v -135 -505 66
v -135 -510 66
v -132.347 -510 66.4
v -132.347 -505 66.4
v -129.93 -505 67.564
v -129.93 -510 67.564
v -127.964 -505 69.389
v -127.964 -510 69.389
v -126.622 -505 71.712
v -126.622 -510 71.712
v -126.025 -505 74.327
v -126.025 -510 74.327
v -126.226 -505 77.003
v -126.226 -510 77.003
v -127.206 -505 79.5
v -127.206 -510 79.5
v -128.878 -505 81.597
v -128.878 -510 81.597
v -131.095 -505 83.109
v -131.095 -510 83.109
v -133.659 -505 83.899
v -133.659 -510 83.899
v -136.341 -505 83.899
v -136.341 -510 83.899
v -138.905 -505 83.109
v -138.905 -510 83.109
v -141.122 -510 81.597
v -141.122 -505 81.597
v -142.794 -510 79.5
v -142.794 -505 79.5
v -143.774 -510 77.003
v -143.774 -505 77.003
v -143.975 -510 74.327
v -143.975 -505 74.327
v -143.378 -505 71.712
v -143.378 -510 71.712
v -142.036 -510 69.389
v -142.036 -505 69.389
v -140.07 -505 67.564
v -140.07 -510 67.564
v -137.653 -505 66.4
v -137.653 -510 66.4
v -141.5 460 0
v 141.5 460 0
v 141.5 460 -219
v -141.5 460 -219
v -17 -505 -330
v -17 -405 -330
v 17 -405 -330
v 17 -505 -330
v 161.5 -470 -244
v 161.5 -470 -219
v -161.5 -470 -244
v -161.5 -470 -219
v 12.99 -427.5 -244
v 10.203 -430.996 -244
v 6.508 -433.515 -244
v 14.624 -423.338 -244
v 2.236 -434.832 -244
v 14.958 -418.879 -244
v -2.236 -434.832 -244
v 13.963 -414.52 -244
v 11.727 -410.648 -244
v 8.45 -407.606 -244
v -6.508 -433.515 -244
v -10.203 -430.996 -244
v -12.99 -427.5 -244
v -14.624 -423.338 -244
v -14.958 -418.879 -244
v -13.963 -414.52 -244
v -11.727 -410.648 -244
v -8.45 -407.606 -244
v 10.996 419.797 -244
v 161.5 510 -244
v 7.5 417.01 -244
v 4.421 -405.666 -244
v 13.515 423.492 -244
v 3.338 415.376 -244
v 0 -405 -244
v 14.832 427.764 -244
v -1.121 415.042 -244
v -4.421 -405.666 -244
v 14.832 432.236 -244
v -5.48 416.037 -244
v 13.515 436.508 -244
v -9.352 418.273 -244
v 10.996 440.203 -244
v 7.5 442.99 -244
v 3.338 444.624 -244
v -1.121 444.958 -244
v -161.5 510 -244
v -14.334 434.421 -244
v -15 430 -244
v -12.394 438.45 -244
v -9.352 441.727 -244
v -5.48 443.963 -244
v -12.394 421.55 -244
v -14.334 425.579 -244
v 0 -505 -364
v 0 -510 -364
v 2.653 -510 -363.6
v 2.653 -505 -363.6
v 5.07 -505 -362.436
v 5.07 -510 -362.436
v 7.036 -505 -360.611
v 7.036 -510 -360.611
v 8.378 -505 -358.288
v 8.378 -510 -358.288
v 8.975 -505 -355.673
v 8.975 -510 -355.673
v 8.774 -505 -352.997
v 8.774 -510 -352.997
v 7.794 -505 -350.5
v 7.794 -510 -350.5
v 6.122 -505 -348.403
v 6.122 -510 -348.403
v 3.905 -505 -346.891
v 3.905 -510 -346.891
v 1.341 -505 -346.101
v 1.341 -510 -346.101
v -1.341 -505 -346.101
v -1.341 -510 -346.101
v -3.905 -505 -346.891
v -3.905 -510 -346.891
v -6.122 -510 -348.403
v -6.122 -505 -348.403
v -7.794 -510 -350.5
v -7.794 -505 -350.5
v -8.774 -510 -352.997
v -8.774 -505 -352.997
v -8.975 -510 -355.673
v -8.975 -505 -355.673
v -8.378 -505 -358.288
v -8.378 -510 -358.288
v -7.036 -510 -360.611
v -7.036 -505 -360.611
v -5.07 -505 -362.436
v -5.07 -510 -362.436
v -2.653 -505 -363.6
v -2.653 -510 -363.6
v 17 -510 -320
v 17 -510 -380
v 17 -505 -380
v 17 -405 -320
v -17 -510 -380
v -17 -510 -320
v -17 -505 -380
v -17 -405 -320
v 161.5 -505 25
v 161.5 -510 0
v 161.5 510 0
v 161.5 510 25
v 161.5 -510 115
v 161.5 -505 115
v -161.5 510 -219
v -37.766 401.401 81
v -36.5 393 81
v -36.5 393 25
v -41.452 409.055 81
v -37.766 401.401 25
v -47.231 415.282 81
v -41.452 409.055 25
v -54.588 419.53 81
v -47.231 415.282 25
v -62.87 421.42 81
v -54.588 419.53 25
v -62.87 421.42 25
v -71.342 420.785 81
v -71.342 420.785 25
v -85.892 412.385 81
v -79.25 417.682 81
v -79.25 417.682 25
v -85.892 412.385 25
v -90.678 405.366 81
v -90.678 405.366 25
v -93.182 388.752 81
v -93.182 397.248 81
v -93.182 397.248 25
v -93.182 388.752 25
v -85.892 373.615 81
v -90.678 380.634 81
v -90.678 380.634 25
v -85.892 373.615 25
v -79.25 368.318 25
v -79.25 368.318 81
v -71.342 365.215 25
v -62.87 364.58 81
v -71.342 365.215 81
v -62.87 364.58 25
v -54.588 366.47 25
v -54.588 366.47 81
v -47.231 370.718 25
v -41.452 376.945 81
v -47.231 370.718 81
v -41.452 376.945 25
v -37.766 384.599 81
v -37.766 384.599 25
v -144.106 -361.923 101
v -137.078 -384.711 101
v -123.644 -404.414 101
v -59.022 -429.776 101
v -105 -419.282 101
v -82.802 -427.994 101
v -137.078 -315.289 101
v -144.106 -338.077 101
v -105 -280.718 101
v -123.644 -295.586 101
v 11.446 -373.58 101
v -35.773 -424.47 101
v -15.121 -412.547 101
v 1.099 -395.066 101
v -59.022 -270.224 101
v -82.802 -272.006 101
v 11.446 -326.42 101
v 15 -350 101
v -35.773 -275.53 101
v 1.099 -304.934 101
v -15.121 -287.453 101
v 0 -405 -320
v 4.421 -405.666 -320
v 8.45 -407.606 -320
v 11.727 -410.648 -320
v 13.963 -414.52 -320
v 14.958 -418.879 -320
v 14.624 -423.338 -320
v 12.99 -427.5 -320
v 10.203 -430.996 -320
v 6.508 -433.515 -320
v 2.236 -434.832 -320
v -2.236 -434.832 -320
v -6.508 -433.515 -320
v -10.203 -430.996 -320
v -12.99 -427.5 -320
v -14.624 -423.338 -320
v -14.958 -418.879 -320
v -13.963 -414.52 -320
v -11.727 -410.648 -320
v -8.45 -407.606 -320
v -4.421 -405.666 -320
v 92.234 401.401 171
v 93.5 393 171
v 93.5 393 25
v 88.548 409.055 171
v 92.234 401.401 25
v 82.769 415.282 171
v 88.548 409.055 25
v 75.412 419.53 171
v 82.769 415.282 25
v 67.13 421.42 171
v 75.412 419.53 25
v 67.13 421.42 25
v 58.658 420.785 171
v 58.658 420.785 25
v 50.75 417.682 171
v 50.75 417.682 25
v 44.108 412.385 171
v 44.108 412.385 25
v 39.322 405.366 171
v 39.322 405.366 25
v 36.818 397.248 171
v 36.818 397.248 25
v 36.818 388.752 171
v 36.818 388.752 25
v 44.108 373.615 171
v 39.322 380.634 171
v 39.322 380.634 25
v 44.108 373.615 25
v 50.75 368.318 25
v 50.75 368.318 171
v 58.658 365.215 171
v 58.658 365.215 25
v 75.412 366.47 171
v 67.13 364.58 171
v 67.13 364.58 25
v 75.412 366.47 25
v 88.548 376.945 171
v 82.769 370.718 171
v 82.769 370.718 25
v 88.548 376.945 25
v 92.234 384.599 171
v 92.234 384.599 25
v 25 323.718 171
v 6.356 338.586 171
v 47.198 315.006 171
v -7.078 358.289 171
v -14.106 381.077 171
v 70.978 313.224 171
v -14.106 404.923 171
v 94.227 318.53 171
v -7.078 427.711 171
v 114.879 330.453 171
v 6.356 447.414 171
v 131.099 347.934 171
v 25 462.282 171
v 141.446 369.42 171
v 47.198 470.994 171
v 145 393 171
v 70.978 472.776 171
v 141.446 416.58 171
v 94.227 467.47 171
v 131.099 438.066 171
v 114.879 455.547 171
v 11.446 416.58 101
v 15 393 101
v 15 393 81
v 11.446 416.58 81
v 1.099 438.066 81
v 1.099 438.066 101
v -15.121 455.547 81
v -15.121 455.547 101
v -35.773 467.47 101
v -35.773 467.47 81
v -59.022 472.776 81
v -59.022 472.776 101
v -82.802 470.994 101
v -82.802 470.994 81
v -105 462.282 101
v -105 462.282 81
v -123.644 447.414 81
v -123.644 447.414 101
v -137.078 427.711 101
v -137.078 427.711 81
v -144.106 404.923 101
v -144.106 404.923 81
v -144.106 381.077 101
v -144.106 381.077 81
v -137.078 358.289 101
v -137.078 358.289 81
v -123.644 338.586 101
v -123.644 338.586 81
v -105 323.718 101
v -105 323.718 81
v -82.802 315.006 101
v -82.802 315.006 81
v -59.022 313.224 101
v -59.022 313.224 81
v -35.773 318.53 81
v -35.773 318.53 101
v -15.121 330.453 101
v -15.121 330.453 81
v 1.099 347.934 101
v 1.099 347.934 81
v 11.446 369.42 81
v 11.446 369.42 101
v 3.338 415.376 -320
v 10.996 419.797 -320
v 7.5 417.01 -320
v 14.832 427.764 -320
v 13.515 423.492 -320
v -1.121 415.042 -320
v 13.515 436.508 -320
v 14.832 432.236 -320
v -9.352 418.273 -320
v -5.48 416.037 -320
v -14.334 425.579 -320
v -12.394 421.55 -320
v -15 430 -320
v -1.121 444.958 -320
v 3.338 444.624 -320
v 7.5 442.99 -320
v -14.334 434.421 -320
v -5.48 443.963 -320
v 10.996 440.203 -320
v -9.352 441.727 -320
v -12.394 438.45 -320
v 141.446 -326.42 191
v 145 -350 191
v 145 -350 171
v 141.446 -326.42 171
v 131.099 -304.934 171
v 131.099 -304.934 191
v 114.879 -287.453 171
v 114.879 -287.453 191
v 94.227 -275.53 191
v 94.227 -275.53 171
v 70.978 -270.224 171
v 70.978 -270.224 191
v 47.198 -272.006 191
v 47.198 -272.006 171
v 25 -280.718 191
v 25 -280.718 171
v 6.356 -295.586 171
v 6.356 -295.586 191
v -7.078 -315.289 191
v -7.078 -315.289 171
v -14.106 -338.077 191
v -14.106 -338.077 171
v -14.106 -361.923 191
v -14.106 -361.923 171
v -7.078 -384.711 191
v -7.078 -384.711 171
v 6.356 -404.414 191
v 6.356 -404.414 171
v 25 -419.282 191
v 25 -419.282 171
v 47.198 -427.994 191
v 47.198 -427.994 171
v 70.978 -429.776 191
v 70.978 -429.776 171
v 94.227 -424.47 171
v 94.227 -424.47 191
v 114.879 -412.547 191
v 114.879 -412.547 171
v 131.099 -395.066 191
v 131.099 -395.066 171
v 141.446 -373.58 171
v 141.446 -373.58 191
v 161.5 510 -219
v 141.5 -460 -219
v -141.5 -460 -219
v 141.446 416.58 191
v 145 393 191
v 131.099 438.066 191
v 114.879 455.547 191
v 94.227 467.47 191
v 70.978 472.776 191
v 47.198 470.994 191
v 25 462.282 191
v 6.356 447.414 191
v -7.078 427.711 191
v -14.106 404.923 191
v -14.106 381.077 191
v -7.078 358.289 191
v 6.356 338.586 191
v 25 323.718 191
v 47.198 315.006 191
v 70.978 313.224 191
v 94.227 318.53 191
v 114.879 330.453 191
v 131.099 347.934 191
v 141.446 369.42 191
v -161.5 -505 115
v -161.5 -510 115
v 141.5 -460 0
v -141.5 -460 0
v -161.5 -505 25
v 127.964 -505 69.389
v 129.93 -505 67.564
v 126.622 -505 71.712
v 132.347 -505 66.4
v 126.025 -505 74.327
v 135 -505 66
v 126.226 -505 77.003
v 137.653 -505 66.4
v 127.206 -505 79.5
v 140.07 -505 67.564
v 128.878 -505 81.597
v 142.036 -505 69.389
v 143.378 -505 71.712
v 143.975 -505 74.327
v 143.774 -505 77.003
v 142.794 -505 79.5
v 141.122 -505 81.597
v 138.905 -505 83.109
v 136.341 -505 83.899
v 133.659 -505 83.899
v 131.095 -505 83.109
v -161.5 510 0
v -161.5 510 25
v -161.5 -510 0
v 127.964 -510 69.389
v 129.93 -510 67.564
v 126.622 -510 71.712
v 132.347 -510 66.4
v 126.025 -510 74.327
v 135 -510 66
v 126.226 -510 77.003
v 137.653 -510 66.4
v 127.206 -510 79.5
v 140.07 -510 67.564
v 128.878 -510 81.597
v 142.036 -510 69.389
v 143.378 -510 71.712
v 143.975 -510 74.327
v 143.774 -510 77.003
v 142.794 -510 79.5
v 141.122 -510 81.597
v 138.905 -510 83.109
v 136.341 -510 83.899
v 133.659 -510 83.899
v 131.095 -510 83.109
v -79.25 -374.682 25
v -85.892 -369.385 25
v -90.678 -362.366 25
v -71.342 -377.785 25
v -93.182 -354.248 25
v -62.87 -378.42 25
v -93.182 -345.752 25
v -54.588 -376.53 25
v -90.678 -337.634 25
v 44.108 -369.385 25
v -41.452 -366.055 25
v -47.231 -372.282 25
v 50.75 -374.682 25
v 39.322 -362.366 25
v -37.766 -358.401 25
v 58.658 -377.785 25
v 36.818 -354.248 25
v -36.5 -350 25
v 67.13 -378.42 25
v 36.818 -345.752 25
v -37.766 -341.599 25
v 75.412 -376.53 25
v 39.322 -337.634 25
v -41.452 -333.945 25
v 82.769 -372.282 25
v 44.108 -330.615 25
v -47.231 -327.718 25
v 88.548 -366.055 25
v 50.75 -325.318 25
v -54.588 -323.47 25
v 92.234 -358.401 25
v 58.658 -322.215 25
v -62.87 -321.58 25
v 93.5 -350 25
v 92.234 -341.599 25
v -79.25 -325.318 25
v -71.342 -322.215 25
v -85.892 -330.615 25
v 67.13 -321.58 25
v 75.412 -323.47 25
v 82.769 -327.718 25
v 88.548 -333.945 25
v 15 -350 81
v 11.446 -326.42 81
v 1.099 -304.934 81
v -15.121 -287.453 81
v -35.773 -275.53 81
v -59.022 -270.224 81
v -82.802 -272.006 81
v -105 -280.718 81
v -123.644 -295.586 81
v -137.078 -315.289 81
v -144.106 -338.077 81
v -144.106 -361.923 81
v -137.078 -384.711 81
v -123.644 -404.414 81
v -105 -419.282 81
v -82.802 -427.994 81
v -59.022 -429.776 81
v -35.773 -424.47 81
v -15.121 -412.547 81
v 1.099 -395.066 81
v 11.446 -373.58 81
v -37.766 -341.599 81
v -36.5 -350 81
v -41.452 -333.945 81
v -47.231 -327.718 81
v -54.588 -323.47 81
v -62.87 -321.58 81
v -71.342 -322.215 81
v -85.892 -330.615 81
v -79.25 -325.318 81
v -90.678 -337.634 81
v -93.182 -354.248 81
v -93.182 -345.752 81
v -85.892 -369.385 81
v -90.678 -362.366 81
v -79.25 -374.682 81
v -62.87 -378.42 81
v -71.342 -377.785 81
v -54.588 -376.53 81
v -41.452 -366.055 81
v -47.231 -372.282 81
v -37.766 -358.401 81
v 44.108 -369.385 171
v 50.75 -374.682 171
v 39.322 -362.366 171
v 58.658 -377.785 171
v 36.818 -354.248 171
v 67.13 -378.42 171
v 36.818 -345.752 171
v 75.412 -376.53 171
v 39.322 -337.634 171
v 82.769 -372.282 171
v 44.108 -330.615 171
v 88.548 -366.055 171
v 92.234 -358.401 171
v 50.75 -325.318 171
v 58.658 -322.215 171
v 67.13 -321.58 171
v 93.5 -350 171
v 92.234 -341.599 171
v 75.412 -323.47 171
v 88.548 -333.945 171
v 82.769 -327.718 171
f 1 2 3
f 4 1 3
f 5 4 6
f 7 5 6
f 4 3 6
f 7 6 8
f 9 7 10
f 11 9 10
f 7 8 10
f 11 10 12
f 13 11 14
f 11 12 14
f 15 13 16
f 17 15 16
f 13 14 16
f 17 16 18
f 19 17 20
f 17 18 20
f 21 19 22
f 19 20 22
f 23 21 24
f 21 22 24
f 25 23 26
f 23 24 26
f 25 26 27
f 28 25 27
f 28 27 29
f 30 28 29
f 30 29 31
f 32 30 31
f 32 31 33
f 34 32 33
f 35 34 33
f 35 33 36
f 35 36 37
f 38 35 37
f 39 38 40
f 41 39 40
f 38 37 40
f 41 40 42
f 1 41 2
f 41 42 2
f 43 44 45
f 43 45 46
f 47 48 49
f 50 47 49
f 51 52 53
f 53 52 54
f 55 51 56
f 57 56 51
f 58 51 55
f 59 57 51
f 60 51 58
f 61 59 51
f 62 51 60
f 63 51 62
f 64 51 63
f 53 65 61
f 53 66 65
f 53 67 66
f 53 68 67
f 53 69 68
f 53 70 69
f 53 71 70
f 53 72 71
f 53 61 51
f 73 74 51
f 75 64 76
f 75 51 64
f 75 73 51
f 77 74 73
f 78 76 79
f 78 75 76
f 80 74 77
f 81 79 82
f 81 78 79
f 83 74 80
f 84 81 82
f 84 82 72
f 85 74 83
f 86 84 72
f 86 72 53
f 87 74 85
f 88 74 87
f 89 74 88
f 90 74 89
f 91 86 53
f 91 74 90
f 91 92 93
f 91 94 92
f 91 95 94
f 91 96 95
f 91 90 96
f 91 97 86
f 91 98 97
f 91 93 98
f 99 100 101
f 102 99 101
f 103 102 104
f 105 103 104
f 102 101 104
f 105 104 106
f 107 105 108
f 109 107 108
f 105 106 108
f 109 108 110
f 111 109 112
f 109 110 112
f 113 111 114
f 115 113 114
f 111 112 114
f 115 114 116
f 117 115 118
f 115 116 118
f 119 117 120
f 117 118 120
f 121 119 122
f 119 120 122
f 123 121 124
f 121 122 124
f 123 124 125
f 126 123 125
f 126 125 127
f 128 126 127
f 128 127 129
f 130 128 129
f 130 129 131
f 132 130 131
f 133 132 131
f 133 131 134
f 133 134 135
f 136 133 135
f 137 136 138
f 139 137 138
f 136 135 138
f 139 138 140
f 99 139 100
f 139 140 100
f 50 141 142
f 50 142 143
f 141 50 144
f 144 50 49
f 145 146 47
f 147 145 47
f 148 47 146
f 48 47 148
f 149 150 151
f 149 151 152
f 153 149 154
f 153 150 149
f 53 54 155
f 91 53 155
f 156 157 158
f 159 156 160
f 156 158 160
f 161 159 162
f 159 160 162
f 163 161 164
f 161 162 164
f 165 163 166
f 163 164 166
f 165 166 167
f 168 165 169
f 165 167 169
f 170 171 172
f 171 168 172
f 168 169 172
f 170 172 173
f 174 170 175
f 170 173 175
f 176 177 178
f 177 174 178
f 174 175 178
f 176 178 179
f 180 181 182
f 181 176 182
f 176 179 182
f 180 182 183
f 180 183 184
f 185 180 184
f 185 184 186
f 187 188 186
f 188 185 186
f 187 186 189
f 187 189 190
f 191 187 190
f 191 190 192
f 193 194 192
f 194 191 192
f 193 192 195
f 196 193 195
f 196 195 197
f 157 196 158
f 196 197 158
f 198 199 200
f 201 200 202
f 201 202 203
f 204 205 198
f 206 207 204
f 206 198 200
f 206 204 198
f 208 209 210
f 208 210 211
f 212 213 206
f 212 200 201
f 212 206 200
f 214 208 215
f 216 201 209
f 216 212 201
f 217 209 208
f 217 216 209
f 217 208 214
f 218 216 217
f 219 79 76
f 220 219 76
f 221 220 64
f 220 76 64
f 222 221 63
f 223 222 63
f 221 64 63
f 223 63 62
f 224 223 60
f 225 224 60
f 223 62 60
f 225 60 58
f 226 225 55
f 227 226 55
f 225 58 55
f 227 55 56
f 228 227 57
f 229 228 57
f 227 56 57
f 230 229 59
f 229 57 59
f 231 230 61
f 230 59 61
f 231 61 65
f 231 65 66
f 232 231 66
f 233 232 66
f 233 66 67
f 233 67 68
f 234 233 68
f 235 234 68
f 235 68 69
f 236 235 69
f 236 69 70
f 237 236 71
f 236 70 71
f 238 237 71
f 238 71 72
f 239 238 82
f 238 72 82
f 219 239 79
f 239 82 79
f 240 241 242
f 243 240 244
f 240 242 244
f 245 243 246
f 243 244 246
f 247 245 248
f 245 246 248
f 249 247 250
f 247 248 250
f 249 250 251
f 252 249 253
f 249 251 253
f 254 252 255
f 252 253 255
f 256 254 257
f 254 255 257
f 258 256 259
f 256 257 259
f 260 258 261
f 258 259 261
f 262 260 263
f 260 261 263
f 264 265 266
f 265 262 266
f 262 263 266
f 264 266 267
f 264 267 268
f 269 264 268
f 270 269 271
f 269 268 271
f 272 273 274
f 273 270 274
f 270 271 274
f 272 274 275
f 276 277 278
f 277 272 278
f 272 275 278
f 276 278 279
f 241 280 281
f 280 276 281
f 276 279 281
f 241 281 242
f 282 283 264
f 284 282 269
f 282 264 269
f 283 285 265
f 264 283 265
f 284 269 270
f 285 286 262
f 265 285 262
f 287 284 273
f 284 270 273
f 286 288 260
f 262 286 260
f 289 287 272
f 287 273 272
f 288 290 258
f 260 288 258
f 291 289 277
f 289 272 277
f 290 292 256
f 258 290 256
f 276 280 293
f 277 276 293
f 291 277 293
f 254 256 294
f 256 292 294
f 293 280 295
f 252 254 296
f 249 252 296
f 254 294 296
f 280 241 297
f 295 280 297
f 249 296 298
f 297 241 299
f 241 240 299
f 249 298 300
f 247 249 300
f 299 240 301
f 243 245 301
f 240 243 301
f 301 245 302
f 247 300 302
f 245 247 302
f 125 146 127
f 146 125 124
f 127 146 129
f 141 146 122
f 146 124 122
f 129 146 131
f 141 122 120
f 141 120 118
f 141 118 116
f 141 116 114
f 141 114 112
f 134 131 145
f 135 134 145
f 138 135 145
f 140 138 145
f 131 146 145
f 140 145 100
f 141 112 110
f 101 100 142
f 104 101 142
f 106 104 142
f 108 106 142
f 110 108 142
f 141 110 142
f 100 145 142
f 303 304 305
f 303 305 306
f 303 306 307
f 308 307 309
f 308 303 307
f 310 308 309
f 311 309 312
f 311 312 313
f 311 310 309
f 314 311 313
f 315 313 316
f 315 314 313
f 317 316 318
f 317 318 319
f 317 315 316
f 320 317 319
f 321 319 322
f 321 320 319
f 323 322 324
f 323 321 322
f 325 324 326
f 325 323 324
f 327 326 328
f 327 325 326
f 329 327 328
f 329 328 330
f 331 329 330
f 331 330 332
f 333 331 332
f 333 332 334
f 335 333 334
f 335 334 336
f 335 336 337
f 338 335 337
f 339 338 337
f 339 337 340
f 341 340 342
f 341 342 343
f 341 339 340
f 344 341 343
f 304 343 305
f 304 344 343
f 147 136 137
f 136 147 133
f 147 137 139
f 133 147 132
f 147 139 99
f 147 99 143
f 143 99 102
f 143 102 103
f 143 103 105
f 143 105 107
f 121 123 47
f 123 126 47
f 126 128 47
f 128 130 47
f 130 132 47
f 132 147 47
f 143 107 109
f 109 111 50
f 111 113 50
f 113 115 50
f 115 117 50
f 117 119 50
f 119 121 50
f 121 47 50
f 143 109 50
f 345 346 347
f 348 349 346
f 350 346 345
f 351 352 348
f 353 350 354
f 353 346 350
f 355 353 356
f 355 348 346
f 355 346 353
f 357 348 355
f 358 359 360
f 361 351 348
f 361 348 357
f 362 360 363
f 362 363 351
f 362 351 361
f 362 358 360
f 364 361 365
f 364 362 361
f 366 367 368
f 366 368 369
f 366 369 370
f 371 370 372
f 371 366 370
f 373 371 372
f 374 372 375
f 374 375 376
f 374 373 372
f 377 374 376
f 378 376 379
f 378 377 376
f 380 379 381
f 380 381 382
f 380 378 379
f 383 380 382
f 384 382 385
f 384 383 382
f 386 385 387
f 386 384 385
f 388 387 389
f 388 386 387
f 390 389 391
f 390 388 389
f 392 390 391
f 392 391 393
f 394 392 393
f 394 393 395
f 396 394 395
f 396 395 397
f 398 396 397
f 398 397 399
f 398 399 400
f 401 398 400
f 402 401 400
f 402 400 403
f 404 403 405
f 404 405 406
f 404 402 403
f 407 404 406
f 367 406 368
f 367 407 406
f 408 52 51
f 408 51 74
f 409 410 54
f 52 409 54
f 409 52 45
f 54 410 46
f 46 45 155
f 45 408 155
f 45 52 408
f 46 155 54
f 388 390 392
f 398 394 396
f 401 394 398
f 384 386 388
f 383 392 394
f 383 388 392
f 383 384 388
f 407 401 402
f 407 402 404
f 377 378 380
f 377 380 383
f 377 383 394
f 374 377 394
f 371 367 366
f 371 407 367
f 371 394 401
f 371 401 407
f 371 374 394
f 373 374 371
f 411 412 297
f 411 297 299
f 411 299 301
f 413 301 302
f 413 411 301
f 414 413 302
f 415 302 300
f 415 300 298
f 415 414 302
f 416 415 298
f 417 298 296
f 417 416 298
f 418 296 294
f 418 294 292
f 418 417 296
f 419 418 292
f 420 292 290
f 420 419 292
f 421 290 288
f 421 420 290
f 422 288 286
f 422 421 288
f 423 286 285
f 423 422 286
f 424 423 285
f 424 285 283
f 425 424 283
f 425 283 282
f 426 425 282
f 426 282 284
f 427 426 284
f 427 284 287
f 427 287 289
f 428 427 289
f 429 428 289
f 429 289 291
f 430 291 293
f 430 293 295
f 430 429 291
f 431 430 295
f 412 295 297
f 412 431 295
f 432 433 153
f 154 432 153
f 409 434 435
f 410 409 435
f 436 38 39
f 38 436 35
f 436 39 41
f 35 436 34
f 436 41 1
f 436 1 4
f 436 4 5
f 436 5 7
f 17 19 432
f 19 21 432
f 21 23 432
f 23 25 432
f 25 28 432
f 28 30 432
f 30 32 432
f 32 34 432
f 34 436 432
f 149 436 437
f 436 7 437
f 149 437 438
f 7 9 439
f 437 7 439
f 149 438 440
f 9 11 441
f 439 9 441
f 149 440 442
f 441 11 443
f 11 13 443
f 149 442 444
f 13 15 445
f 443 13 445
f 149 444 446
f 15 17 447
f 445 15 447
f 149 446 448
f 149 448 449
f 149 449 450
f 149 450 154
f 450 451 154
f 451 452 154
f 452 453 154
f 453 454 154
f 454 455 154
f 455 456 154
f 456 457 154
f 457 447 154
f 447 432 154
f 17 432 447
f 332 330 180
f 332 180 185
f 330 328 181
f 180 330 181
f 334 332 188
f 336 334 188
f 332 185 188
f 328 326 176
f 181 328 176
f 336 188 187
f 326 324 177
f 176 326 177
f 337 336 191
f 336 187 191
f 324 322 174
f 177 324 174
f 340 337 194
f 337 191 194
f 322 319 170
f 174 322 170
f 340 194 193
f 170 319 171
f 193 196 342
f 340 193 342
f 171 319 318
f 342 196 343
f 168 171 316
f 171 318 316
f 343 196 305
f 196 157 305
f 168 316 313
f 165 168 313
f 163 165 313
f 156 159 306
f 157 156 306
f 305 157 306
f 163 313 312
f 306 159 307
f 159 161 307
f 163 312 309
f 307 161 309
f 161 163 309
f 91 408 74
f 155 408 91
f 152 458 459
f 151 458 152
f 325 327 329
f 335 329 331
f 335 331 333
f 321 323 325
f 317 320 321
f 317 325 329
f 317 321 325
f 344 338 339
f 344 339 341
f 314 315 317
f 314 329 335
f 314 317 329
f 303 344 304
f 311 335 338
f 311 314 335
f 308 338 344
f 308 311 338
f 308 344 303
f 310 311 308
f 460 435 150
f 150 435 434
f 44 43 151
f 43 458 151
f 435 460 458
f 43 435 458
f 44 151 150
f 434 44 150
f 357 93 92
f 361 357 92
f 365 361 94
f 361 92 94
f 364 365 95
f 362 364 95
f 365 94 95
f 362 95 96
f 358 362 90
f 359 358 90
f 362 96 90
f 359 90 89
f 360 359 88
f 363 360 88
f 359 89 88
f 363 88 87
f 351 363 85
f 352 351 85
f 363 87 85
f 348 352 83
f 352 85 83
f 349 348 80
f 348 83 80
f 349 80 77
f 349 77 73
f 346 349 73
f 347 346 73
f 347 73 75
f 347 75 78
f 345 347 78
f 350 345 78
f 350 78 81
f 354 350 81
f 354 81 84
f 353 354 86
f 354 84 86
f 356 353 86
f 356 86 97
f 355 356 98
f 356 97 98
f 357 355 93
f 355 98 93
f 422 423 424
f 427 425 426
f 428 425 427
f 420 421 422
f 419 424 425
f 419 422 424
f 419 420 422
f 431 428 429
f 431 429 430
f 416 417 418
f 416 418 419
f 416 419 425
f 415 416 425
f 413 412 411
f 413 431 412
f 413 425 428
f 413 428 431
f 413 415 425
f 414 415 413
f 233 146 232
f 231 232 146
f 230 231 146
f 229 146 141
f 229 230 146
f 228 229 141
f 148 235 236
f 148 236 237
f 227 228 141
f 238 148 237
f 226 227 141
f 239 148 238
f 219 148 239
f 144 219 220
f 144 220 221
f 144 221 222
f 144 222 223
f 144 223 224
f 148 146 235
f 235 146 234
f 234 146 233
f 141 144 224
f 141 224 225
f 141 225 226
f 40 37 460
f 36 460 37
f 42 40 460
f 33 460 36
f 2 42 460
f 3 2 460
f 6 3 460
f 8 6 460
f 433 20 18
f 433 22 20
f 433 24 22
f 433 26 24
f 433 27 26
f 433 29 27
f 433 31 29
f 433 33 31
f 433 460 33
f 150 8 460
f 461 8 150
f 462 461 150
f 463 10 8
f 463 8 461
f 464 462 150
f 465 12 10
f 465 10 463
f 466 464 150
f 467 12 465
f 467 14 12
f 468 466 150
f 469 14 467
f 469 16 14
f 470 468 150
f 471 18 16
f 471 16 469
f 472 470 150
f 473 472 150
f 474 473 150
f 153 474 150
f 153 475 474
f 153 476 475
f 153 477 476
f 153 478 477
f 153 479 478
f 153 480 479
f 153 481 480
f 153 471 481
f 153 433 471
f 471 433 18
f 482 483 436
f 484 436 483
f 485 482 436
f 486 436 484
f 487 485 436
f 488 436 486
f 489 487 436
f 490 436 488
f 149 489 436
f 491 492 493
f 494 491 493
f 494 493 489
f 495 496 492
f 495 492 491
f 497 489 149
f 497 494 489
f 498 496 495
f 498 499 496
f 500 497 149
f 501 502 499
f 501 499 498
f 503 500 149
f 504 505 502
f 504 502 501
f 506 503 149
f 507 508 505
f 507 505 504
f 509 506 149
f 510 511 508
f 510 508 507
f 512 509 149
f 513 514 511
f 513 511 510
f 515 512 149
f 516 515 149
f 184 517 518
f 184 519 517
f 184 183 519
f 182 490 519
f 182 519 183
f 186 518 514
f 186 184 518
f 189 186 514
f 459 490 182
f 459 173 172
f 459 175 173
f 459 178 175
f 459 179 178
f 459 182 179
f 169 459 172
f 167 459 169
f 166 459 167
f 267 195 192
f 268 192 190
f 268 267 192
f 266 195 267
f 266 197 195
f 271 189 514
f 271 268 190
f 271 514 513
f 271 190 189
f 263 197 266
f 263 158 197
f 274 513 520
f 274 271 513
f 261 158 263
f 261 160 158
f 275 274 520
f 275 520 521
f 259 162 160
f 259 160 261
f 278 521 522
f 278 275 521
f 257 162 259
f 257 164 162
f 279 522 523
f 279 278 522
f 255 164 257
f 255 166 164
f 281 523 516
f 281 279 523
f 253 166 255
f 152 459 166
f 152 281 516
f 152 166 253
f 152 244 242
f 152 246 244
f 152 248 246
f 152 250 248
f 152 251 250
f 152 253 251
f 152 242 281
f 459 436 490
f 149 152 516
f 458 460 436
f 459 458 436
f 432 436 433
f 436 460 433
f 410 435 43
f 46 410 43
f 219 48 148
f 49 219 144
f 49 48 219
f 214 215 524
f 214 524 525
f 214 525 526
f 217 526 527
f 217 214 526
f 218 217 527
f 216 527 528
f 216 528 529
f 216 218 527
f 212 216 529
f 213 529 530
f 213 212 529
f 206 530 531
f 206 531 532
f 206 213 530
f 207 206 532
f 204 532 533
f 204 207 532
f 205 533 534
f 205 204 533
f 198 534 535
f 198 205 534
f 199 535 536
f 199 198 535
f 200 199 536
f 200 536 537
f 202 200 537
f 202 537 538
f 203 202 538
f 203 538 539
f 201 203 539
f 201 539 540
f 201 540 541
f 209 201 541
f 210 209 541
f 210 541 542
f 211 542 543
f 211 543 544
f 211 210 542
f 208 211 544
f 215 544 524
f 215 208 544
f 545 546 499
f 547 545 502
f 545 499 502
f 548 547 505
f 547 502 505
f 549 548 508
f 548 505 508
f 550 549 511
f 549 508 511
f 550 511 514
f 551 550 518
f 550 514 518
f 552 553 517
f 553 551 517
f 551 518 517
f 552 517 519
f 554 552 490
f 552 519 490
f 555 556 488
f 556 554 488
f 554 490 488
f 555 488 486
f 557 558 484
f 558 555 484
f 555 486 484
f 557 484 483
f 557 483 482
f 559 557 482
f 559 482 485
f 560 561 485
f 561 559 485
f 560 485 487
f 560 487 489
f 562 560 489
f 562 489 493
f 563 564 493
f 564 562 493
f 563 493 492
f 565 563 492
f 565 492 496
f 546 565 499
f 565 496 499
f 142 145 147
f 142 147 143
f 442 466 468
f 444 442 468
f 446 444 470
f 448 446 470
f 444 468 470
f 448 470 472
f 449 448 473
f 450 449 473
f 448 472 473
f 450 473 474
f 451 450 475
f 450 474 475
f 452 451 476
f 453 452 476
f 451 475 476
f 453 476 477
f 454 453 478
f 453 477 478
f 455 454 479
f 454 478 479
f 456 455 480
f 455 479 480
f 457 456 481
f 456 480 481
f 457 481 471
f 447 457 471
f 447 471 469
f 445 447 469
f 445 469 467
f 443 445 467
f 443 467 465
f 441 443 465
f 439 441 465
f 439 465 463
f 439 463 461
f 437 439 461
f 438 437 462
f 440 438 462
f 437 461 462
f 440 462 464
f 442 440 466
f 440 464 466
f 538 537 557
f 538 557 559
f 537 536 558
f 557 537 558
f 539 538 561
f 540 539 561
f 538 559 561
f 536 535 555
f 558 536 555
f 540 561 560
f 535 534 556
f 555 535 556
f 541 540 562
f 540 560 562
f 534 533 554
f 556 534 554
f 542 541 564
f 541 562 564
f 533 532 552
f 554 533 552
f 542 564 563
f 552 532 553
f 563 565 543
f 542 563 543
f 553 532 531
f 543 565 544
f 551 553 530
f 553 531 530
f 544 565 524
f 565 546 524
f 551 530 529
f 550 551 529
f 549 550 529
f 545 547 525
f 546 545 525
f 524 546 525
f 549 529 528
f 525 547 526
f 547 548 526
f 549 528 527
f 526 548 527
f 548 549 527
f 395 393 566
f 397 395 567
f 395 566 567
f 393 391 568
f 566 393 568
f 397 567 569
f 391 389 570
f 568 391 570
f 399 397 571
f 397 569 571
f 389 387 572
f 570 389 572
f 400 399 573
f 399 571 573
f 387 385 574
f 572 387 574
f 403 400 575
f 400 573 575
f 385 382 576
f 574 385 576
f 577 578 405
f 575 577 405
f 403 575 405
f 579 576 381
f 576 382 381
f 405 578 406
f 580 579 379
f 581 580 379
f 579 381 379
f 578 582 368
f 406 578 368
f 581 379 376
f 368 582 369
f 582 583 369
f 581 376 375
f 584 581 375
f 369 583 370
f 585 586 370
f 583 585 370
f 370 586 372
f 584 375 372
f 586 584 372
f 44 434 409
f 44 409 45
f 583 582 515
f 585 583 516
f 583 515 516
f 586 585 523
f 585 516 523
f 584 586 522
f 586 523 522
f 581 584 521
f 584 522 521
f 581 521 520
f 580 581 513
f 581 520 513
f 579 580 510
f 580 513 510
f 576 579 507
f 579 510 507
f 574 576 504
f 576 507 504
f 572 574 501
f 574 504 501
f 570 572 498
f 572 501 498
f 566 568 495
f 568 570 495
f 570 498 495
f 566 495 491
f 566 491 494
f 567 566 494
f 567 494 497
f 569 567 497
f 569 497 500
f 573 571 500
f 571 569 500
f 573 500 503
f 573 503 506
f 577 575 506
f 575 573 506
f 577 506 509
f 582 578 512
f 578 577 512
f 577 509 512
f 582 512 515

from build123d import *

# Parameters (mm, degrees)
SKETCH_1_W        = 323
SKETCH_1_H        = 1020
EXTRUDE_1_DEPTH   = 25
SKETCH_3_W        = 323
SKETCH_3_H        = 980
EXTRUDE_2_DEPTH   = 25
SKETCH_15_W       = 283
SKETCH_15_H       = 920
EXTRUDE3_DEPTH    = 219
SKETCH3_W         = 323
SKETCH3_H         = 90
SKETCH3_R         = 9
SKETCH3_W_2       = 34
SKETCH3_H_2       = 50
EXTRUDE6_DEPTH    = 5
SKETCH4_W         = 34
SKETCH4_H         = 105
EXTRUDE7_DEPTH    = 10
SKETCH5_R         = 15
EXTRUDE8_DEPTH    = 76
SKETCH_17_R       = 28.5
EXTRUDE_1_2_DEPTH = 76
SKETCH_18_R       = 80
EXTRUDE_2_2_DEPTH = 20
SKETCH_19_R       = 28.5
EXTRUDE_3_DEPTH   = 90
SKETCH_20_R       = 80
EXTRUDE_4_DEPTH   = 20


with BuildPart() as part:
    # Эскиз1 → Extrude 1 (new body)
    with BuildSketch(Plane.XY):
        Rectangle(SKETCH_1_W, SKETCH_1_H)
    extrude(amount=EXTRUDE_1_DEPTH)



with BuildPart() as body_2:
    # Эскиз3 → Extrude 2 (new body)
    with BuildSketch(Plane(origin=(0, 0, -219), x_dir=(-1, 0, 0), z_dir=(0, 0, -1))):
        with Locations((0, 20)):
            Rectangle(SKETCH_3_W, SKETCH_3_H)
    extrude(amount=EXTRUDE_2_DEPTH)


with BuildPart() as part_1:
    add(part.part)

    add(body_2.part)  # Extrude3 merges body 2
    # Эскиз15 → Extrude3 (add)
    with BuildSketch(Plane(origin=(0, 0, 0), x_dir=(-1, 0, 0), z_dir=(0, 0, -1))):
        Rectangle(SKETCH_15_W, SKETCH_15_H)
    extrude(amount=EXTRUDE3_DEPTH)

    # Sketch3 → Extrude6 (add)
    # profile 1 of 2: a face of its own
    with BuildSketch(Plane.XZ.offset(510)):
        with Locations((0, 70)):
            Rectangle(SKETCH3_W, SKETCH3_H)
        with Locations(Location((-135, 75, 0), (0, 0, 270))):
            Circle(SKETCH3_R, mode=Mode.SUBTRACT)
        with Locations(Location((135, 75, 0), (0, 0, 270))):
            Circle(SKETCH3_R, mode=Mode.SUBTRACT)
    # profile 2 of 2: a face of its own
    with BuildSketch(Plane.XZ.offset(510)):
        with Locations((0, -355)):
            Rectangle(SKETCH3_W_2, SKETCH3_H_2)
        with Locations(Location((0, -355, 0), (0, 0, 270))):
            Circle(SKETCH3_R, mode=Mode.SUBTRACT)
    extrude(amount=-EXTRUDE6_DEPTH)


with BuildPart() as extrude6_piece_1:
    # of the separate pieces the step leaves, piece 1, a body of its own (extrude6_pieces)
    add(part_1.part.solids().sort_by_distance((161.5, 510, -219))[0])



with BuildPart() as extrude6_piece_2:
    # of the separate pieces the step leaves, piece 2, a body of its own (extrude6_pieces)
    add(part_1.part.solids().sort_by_distance((-17, -510, -380))[0])

    # Sketch4 → Extrude7 (add)
    with BuildSketch(Plane.XY.offset(-330)):
        with Locations((0, -457.5)):
            Rectangle(SKETCH4_W, SKETCH4_H)
    extrude(amount=EXTRUDE7_DEPTH)


with BuildPart() as extrude6_piece_1_1:
    add(extrude6_piece_1.part)

    add(extrude6_piece_2.part)  # Extrude8 merges Extrude6 piece 2
    # Sketch5 → Extrude8 (add)
    with BuildSketch(Plane(origin=(0, 0, -244), x_dir=(-1, 0, 0), z_dir=(0, 0, -1))):
        with Locations(Location((0, -420, 0), (0, 0, 90))):
            Circle(SKETCH5_R)
        with Locations((0, 430)):
            Circle(SKETCH5_R)
    extrude(amount=EXTRUDE8_DEPTH)

    # Эскиз17 → Extrude 1 2 (add)
    with BuildSketch(Plane.XY.offset(25)):
        with Locations((-65, -350)):
            Circle(SKETCH_17_R)
        with Locations((65, -350)):
            Circle(SKETCH_17_R)
        with Locations((-65, 393)):
            Circle(SKETCH_17_R)
        with Locations((65, 393)):
            Circle(SKETCH_17_R)
    extrude(amount=EXTRUDE_1_2_DEPTH)

    # Эскиз18 → Extrude 2 2 (add)
    with BuildSketch(Plane.XY.offset(101)):
        with Locations((-65, 393)):
            Circle(SKETCH_18_R)
        with Locations((-65, -350)):
            Circle(SKETCH_18_R)
    extrude(amount=-EXTRUDE_2_2_DEPTH)

    # Эскиз19 → Бобышка-Вытянуть3 (add)
    with BuildSketch(Plane.XY.offset(101)):
        with Locations((65, 393)):
            Circle(SKETCH_19_R)
        with Locations((65, -350)):
            Circle(SKETCH_19_R)
    extrude(amount=EXTRUDE_3_DEPTH)

    # Эскиз20 → Бобышка-Вытянуть4 (add)
    with BuildSketch(Plane.XY.offset(191)):
        with Locations((65, 393)):
            Circle(SKETCH_20_R)
        with Locations((65, -350)):
            Circle(SKETCH_20_R)
    extrude(amount=-EXTRUDE_4_DEPTH)


solid = extrude6_piece_1_1.part
